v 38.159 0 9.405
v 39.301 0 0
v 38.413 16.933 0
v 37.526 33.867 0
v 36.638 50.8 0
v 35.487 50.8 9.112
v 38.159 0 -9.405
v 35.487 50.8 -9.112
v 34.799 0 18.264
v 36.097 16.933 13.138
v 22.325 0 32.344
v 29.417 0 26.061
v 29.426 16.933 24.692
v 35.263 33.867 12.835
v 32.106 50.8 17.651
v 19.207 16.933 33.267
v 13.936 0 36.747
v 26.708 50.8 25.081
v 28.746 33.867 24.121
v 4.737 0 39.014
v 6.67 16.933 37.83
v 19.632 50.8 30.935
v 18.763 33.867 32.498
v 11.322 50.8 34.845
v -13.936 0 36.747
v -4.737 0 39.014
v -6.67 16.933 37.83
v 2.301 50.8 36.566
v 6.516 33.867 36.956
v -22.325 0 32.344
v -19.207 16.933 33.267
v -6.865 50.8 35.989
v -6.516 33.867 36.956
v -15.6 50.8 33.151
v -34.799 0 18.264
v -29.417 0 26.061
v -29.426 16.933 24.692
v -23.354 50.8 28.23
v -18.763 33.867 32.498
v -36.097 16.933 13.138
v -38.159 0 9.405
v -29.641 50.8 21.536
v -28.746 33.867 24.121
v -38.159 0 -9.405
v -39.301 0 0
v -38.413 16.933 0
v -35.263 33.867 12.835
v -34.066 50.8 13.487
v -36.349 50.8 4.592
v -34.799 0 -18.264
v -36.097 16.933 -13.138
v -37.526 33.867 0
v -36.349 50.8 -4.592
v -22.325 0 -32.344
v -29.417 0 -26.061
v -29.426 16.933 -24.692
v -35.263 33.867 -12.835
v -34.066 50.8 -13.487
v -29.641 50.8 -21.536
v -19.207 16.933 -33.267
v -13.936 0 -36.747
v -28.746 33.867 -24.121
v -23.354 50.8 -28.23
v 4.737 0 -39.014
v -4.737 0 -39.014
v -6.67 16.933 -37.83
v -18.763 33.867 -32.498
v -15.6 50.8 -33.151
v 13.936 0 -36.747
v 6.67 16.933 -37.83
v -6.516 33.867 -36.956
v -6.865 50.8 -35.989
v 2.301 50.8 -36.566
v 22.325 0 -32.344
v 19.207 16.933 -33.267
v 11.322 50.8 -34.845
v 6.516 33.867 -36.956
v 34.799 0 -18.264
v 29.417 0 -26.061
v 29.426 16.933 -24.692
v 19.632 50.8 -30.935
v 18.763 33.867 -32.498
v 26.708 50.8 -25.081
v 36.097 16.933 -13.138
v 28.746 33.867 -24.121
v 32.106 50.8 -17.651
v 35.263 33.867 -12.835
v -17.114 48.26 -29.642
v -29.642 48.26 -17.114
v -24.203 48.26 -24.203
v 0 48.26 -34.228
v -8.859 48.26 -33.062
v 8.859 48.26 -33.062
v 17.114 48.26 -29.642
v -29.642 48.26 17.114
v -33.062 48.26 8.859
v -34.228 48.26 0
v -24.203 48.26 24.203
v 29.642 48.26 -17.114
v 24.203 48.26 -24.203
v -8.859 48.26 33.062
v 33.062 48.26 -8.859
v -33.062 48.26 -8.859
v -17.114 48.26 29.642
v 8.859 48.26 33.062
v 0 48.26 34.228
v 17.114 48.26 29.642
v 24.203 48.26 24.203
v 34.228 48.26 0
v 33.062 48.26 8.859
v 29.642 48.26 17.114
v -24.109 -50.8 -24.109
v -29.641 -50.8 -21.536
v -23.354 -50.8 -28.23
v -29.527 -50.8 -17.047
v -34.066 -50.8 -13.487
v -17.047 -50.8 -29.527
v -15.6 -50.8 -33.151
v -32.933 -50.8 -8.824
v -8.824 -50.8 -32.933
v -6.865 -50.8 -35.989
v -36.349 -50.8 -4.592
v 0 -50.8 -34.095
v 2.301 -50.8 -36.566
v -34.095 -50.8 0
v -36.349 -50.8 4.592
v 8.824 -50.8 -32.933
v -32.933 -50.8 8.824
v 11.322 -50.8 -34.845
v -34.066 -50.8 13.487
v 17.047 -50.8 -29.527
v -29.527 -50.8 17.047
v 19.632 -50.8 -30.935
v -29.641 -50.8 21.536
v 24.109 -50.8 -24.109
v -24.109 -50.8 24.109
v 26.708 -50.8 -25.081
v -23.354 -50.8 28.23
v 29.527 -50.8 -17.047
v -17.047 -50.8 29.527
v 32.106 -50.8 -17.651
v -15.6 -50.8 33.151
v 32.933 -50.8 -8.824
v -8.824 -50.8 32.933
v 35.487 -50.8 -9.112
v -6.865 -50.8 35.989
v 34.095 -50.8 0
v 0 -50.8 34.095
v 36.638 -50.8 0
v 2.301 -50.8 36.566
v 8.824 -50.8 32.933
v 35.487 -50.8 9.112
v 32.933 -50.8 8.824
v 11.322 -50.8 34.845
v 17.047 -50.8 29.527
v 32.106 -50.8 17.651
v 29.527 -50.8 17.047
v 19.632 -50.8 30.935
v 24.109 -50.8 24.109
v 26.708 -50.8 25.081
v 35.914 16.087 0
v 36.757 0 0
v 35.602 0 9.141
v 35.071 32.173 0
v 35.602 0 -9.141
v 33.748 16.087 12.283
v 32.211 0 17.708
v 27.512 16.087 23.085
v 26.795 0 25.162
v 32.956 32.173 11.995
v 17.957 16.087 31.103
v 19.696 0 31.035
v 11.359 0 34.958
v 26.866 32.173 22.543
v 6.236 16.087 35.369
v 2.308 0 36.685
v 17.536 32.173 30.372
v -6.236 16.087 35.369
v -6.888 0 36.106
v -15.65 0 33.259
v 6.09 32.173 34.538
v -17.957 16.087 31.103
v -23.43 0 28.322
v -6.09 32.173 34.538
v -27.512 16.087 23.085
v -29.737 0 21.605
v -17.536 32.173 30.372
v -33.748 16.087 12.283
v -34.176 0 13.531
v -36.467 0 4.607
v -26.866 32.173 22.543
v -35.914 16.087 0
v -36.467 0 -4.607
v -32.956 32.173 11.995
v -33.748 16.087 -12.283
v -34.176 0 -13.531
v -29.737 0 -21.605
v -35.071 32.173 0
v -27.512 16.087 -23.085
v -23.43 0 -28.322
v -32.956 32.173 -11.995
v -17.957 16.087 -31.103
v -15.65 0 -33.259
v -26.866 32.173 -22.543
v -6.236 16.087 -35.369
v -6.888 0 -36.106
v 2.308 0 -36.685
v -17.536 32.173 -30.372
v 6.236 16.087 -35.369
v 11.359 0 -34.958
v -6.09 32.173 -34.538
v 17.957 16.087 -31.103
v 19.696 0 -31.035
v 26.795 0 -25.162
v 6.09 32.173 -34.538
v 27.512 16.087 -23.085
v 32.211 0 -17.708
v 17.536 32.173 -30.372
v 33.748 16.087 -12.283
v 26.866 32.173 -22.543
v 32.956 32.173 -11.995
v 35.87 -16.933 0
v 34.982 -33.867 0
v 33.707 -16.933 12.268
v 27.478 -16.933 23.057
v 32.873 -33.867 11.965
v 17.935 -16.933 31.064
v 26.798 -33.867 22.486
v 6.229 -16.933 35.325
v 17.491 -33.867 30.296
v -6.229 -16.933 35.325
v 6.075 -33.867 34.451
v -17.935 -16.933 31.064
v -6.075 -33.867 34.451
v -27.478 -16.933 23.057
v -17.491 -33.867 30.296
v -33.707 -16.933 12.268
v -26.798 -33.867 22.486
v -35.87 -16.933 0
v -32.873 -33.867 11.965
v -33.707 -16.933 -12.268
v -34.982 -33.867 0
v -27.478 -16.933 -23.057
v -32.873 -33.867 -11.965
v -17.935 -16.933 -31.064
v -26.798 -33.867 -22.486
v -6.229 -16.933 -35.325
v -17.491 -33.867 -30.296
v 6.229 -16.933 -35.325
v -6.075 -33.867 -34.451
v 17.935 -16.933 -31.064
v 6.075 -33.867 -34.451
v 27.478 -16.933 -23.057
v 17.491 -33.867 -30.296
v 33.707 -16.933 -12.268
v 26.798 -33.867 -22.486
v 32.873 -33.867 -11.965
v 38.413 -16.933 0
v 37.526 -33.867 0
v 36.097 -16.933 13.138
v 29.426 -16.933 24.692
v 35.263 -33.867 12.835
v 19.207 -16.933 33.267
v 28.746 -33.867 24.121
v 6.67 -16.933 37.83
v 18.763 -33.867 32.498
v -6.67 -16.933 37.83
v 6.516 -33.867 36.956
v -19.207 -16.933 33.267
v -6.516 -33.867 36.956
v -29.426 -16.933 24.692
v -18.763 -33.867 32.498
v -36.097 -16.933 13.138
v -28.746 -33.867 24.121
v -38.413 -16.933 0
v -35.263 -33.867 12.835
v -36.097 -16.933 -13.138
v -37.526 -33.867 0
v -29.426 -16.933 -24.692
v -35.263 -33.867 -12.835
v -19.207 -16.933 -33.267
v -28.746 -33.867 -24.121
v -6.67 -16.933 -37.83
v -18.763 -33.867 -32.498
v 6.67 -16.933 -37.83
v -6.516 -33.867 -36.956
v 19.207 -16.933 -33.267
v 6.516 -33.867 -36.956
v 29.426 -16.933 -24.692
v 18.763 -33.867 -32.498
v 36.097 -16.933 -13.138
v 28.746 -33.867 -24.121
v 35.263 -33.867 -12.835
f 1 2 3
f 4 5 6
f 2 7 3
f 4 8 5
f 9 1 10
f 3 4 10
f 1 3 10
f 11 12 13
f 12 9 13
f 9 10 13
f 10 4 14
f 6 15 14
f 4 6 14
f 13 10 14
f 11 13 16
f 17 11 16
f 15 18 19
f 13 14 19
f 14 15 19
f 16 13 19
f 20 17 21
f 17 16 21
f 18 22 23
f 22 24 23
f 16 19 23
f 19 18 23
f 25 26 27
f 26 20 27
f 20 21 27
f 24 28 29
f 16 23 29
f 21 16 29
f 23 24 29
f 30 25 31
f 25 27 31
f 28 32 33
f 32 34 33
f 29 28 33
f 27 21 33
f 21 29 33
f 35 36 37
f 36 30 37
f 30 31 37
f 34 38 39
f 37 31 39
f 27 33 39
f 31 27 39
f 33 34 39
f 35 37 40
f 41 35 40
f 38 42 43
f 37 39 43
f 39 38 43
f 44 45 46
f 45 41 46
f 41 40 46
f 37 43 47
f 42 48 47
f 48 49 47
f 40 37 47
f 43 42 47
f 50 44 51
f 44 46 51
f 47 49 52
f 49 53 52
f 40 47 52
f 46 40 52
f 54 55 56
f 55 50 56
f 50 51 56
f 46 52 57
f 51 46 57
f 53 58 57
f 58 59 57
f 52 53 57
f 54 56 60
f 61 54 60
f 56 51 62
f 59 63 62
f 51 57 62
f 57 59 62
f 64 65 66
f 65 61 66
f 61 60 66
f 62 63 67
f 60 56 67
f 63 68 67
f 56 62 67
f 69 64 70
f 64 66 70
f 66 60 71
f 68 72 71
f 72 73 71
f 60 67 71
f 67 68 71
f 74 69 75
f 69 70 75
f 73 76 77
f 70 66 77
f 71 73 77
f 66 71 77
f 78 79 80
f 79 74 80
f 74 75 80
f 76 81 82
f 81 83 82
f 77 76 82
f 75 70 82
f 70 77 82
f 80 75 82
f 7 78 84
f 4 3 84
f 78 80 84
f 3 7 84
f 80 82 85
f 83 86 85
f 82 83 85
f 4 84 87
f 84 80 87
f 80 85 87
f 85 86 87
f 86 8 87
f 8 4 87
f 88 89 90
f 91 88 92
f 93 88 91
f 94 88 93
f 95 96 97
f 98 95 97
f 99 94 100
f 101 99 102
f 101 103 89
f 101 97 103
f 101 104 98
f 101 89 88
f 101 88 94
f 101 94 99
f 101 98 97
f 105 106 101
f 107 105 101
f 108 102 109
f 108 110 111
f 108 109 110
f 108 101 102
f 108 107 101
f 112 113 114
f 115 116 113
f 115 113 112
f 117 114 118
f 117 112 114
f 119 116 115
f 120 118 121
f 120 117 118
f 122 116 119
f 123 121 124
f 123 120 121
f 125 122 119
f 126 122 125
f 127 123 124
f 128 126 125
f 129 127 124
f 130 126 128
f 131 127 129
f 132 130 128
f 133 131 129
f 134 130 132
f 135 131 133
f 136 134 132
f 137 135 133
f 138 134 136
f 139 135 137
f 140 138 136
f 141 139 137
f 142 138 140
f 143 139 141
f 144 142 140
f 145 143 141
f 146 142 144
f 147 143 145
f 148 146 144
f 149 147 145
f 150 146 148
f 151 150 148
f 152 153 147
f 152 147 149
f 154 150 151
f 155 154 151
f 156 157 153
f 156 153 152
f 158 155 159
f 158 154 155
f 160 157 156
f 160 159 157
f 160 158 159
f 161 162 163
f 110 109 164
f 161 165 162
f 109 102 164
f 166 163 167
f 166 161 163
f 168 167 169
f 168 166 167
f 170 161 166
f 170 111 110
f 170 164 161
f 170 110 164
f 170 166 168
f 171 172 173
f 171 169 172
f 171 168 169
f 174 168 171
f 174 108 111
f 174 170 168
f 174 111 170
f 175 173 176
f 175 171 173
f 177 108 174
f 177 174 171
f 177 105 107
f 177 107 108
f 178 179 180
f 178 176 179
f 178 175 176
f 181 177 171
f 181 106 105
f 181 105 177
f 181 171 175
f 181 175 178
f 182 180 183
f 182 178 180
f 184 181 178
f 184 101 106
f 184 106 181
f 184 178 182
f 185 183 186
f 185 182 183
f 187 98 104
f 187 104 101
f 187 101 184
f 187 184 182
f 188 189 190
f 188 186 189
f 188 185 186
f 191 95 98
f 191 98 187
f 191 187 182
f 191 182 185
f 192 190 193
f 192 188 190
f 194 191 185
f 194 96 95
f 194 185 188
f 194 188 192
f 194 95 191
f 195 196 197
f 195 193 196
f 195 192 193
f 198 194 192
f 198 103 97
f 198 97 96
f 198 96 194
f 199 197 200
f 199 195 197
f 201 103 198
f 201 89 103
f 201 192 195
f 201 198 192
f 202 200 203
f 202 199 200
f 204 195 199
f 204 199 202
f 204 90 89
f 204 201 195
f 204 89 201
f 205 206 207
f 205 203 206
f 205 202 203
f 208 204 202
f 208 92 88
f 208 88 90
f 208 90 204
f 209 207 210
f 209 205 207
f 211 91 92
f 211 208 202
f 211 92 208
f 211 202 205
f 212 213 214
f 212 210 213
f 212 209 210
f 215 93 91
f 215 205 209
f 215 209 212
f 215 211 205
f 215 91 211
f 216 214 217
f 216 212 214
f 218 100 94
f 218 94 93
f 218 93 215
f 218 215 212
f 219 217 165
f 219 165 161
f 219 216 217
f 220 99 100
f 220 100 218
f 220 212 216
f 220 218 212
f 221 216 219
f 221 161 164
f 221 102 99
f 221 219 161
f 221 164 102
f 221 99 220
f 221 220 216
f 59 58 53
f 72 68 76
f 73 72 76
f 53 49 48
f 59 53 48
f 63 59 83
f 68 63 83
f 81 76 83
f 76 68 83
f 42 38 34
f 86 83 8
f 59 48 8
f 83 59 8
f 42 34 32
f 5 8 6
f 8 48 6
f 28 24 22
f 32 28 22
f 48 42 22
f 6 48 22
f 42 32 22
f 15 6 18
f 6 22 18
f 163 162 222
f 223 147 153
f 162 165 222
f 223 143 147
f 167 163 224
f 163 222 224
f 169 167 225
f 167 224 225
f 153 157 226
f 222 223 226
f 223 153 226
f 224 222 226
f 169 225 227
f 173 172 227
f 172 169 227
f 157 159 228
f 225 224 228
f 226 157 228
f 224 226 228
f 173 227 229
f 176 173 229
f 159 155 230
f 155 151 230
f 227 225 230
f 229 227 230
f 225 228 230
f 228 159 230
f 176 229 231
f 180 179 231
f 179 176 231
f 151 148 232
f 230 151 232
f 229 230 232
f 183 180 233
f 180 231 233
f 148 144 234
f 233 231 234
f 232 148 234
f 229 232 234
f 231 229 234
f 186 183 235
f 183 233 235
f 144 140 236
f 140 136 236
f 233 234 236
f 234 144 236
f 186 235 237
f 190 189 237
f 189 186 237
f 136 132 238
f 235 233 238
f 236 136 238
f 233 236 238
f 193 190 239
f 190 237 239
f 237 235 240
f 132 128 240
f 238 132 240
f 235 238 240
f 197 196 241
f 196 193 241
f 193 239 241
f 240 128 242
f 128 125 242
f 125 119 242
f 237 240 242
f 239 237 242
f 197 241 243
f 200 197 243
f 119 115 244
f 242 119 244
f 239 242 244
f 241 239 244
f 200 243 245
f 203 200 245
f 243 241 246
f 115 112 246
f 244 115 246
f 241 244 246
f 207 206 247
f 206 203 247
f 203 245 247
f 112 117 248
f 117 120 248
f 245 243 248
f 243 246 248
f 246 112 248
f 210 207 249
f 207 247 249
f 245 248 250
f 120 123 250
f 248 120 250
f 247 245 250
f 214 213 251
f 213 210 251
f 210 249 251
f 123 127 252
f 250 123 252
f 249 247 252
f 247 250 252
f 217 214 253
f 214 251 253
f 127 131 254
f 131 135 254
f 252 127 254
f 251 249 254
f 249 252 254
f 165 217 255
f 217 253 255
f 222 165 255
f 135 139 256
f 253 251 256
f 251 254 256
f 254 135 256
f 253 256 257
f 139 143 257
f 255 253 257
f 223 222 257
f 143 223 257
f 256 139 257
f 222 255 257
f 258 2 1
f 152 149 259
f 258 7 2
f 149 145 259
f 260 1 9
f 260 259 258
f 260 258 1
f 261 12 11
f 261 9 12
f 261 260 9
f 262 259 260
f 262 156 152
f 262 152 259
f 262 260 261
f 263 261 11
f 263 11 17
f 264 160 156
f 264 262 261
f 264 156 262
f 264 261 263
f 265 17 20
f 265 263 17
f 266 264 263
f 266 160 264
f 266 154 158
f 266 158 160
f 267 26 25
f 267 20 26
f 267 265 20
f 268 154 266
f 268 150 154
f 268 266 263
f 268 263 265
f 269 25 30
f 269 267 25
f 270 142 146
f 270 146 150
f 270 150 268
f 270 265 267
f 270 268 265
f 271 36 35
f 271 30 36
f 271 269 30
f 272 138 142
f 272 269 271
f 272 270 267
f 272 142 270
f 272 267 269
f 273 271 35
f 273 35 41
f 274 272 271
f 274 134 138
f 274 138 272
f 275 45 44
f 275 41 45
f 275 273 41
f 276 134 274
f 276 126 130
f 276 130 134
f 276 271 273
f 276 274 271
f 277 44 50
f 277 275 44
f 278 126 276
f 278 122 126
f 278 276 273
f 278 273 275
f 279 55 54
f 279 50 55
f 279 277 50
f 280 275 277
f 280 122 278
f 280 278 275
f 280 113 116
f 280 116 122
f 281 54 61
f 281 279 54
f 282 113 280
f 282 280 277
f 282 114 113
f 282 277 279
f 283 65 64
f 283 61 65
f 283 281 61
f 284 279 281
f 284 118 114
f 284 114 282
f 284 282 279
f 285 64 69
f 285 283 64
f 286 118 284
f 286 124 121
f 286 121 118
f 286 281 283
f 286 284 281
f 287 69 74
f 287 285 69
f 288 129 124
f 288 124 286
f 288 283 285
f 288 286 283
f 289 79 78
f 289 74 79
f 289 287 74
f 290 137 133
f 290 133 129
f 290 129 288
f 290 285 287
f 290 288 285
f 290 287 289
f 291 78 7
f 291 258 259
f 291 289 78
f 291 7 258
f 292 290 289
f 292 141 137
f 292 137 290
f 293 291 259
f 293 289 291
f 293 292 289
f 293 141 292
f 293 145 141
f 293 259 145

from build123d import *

# Parameters (mm, degrees)
F0_R     = 39.3007161627
F1_DEPTH = 50.8
F1_TAPER = 3
F2_T     = -2.54


with BuildPart() as f1:
    # F0 (on Front) → F1 (new body, symmetric)
    with BuildSketch(Plane.XZ):
        Circle(F0_R)
    extrude(amount=F1_DEPTH, both=True, taper=F1_TAPER)

    # F2
    f2_openings = [f1.faces().sort_by_distance(p)[0] for p in [
        (0, -50.8, 0),
    ]]
    offset(amount=F2_T, openings=f2_openings, kind=Kind.INTERSECTION)


solid = f1.part
